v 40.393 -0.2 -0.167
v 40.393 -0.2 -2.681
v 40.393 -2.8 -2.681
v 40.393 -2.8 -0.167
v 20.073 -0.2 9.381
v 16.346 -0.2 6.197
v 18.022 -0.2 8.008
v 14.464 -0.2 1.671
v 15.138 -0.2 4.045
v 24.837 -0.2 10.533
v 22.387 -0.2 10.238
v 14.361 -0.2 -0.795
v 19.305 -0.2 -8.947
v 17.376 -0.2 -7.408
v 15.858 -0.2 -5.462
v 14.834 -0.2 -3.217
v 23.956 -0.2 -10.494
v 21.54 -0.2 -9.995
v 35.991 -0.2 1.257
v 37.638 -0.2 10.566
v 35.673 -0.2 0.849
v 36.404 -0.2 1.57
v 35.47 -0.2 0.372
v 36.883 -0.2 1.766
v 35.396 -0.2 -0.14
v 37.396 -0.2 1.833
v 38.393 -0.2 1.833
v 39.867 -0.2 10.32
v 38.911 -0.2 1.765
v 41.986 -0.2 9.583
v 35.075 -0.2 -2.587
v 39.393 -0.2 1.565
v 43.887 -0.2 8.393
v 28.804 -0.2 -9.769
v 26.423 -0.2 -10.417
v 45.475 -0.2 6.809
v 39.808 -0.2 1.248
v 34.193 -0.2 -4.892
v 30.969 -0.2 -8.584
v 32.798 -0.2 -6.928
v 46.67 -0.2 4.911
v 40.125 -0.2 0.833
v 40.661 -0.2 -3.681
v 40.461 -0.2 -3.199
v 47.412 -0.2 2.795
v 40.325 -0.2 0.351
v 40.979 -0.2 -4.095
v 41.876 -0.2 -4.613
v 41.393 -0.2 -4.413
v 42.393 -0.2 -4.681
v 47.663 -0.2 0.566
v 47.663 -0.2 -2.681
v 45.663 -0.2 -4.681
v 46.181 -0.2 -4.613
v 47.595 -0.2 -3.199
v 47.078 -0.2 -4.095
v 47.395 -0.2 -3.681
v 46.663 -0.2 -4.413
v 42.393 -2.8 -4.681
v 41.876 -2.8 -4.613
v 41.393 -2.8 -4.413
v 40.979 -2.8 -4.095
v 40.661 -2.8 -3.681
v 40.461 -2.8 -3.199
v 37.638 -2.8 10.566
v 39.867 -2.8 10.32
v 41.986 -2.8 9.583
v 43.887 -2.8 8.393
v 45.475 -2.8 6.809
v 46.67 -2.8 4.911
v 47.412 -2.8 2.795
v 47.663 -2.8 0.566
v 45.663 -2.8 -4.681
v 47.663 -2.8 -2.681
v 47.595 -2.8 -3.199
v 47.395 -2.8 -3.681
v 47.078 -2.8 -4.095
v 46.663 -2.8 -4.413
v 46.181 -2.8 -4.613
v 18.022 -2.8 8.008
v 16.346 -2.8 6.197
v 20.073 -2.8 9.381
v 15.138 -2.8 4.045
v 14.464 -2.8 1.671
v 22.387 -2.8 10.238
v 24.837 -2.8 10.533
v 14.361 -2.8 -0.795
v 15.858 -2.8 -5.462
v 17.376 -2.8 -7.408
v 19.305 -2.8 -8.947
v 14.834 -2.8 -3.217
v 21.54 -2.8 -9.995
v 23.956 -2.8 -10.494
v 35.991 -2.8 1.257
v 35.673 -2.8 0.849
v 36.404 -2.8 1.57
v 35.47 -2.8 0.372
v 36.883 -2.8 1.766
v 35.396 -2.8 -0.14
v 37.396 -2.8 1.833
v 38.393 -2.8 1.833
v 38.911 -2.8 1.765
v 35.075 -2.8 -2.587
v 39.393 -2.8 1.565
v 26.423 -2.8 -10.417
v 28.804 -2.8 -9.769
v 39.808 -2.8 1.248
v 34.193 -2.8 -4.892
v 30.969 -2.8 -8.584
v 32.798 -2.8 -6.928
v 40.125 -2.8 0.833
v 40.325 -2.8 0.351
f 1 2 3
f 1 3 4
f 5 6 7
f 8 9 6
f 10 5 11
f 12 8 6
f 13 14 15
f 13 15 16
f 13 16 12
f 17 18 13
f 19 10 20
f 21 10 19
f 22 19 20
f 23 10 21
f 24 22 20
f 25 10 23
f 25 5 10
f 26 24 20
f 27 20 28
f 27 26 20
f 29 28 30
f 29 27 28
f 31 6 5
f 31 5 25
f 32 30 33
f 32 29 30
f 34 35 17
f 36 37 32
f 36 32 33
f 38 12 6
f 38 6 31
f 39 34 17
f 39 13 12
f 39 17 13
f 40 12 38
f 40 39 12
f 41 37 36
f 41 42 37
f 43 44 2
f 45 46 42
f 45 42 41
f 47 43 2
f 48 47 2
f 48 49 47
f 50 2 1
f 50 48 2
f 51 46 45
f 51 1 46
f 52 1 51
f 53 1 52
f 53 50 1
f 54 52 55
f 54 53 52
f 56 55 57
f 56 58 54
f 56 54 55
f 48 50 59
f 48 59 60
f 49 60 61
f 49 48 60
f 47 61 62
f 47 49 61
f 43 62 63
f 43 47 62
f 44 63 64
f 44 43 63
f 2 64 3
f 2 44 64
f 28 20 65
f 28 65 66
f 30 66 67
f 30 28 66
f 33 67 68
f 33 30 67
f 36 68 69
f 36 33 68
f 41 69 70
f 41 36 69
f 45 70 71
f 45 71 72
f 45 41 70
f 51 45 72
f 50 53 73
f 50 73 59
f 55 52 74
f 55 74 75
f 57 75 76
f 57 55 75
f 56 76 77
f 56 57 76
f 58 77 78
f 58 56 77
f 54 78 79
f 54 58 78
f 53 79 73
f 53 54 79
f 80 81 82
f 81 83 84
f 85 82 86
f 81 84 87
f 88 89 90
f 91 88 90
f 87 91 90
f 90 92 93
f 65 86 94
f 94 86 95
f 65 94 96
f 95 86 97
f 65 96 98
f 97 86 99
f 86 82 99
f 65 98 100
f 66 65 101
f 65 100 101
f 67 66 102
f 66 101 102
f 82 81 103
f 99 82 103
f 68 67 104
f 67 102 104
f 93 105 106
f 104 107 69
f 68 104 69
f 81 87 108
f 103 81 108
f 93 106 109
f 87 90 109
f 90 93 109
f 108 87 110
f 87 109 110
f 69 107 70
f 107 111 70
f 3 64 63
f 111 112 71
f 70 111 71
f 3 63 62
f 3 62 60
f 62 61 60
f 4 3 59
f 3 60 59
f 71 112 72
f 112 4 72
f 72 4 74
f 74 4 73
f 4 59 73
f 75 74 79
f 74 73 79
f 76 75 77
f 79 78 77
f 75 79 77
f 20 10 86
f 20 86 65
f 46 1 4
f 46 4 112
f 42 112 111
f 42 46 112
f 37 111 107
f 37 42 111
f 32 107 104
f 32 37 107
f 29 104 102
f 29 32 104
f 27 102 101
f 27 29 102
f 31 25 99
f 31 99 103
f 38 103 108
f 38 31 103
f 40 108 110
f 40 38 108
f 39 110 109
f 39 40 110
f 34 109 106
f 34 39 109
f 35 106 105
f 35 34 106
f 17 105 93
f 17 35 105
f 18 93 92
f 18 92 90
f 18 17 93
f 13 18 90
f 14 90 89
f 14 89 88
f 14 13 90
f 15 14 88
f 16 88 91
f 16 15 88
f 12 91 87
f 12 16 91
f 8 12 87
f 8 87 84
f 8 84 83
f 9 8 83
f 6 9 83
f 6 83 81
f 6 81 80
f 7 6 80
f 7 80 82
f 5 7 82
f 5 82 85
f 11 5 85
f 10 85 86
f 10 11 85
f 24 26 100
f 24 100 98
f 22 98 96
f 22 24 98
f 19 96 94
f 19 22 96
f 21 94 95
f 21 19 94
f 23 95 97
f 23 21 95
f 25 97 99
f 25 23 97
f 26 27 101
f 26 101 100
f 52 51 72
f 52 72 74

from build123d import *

# Parameters (mm, degrees)
BOSS_EXTRUDE1_START = -0.2
BOSS_EXTRUDE1_DEPTH = 2.6


with BuildPart() as part:
    # Sketch3 → Boss-Extrude1 (new body)
    with BuildSketch(Plane(origin=(0, 0, 0), x_dir=(1, 0, 0), z_dir=(0, 1, 0)).offset(BOSS_EXTRUDE1_START)):
        with BuildLine():
            Line((24.837294245, -10.53319149), (37.637975917, -10.56578536))
            ThreePointArc((37.637975917, -10.56578536), (44.725498152, -7.645882227), (47.663438439, -0.565817777))
            Line((47.663438439, -0.565817777), (47.663438439, 2.68092068))
            ThreePointArc((47.663438439, 2.68092068), (47.077652002, 4.095134243), (45.663438439, 4.68092068))
            Line((45.663438439, 4.68092068), (42.393317115, 4.68092068))
            ThreePointArc((42.393317115, 4.68092068), (40.979103553, 4.095134243), (40.393317115, 2.68092068))
            Line((40.393317115, 2.68092068), (40.393317115, 0.166619972))
            ThreePointArc((40.393317115, 0.166619972), (39.807530678, -1.24759359), (38.393317115, -1.833380028))
            Line((38.393317115, -1.833380028), (37.396232536, -1.833380028))
            ThreePointArc((37.396232536, -1.833380028), (35.991450888, -1.256963015), (35.396409281, 0.14003145))
            ThreePointArc((35.396409281, 0.14003145), (17.376079319, 7.407980257), (24.837294245, -10.53319149))
        make_face()
    extrude(amount=-BOSS_EXTRUDE1_DEPTH)


solid = part.part
